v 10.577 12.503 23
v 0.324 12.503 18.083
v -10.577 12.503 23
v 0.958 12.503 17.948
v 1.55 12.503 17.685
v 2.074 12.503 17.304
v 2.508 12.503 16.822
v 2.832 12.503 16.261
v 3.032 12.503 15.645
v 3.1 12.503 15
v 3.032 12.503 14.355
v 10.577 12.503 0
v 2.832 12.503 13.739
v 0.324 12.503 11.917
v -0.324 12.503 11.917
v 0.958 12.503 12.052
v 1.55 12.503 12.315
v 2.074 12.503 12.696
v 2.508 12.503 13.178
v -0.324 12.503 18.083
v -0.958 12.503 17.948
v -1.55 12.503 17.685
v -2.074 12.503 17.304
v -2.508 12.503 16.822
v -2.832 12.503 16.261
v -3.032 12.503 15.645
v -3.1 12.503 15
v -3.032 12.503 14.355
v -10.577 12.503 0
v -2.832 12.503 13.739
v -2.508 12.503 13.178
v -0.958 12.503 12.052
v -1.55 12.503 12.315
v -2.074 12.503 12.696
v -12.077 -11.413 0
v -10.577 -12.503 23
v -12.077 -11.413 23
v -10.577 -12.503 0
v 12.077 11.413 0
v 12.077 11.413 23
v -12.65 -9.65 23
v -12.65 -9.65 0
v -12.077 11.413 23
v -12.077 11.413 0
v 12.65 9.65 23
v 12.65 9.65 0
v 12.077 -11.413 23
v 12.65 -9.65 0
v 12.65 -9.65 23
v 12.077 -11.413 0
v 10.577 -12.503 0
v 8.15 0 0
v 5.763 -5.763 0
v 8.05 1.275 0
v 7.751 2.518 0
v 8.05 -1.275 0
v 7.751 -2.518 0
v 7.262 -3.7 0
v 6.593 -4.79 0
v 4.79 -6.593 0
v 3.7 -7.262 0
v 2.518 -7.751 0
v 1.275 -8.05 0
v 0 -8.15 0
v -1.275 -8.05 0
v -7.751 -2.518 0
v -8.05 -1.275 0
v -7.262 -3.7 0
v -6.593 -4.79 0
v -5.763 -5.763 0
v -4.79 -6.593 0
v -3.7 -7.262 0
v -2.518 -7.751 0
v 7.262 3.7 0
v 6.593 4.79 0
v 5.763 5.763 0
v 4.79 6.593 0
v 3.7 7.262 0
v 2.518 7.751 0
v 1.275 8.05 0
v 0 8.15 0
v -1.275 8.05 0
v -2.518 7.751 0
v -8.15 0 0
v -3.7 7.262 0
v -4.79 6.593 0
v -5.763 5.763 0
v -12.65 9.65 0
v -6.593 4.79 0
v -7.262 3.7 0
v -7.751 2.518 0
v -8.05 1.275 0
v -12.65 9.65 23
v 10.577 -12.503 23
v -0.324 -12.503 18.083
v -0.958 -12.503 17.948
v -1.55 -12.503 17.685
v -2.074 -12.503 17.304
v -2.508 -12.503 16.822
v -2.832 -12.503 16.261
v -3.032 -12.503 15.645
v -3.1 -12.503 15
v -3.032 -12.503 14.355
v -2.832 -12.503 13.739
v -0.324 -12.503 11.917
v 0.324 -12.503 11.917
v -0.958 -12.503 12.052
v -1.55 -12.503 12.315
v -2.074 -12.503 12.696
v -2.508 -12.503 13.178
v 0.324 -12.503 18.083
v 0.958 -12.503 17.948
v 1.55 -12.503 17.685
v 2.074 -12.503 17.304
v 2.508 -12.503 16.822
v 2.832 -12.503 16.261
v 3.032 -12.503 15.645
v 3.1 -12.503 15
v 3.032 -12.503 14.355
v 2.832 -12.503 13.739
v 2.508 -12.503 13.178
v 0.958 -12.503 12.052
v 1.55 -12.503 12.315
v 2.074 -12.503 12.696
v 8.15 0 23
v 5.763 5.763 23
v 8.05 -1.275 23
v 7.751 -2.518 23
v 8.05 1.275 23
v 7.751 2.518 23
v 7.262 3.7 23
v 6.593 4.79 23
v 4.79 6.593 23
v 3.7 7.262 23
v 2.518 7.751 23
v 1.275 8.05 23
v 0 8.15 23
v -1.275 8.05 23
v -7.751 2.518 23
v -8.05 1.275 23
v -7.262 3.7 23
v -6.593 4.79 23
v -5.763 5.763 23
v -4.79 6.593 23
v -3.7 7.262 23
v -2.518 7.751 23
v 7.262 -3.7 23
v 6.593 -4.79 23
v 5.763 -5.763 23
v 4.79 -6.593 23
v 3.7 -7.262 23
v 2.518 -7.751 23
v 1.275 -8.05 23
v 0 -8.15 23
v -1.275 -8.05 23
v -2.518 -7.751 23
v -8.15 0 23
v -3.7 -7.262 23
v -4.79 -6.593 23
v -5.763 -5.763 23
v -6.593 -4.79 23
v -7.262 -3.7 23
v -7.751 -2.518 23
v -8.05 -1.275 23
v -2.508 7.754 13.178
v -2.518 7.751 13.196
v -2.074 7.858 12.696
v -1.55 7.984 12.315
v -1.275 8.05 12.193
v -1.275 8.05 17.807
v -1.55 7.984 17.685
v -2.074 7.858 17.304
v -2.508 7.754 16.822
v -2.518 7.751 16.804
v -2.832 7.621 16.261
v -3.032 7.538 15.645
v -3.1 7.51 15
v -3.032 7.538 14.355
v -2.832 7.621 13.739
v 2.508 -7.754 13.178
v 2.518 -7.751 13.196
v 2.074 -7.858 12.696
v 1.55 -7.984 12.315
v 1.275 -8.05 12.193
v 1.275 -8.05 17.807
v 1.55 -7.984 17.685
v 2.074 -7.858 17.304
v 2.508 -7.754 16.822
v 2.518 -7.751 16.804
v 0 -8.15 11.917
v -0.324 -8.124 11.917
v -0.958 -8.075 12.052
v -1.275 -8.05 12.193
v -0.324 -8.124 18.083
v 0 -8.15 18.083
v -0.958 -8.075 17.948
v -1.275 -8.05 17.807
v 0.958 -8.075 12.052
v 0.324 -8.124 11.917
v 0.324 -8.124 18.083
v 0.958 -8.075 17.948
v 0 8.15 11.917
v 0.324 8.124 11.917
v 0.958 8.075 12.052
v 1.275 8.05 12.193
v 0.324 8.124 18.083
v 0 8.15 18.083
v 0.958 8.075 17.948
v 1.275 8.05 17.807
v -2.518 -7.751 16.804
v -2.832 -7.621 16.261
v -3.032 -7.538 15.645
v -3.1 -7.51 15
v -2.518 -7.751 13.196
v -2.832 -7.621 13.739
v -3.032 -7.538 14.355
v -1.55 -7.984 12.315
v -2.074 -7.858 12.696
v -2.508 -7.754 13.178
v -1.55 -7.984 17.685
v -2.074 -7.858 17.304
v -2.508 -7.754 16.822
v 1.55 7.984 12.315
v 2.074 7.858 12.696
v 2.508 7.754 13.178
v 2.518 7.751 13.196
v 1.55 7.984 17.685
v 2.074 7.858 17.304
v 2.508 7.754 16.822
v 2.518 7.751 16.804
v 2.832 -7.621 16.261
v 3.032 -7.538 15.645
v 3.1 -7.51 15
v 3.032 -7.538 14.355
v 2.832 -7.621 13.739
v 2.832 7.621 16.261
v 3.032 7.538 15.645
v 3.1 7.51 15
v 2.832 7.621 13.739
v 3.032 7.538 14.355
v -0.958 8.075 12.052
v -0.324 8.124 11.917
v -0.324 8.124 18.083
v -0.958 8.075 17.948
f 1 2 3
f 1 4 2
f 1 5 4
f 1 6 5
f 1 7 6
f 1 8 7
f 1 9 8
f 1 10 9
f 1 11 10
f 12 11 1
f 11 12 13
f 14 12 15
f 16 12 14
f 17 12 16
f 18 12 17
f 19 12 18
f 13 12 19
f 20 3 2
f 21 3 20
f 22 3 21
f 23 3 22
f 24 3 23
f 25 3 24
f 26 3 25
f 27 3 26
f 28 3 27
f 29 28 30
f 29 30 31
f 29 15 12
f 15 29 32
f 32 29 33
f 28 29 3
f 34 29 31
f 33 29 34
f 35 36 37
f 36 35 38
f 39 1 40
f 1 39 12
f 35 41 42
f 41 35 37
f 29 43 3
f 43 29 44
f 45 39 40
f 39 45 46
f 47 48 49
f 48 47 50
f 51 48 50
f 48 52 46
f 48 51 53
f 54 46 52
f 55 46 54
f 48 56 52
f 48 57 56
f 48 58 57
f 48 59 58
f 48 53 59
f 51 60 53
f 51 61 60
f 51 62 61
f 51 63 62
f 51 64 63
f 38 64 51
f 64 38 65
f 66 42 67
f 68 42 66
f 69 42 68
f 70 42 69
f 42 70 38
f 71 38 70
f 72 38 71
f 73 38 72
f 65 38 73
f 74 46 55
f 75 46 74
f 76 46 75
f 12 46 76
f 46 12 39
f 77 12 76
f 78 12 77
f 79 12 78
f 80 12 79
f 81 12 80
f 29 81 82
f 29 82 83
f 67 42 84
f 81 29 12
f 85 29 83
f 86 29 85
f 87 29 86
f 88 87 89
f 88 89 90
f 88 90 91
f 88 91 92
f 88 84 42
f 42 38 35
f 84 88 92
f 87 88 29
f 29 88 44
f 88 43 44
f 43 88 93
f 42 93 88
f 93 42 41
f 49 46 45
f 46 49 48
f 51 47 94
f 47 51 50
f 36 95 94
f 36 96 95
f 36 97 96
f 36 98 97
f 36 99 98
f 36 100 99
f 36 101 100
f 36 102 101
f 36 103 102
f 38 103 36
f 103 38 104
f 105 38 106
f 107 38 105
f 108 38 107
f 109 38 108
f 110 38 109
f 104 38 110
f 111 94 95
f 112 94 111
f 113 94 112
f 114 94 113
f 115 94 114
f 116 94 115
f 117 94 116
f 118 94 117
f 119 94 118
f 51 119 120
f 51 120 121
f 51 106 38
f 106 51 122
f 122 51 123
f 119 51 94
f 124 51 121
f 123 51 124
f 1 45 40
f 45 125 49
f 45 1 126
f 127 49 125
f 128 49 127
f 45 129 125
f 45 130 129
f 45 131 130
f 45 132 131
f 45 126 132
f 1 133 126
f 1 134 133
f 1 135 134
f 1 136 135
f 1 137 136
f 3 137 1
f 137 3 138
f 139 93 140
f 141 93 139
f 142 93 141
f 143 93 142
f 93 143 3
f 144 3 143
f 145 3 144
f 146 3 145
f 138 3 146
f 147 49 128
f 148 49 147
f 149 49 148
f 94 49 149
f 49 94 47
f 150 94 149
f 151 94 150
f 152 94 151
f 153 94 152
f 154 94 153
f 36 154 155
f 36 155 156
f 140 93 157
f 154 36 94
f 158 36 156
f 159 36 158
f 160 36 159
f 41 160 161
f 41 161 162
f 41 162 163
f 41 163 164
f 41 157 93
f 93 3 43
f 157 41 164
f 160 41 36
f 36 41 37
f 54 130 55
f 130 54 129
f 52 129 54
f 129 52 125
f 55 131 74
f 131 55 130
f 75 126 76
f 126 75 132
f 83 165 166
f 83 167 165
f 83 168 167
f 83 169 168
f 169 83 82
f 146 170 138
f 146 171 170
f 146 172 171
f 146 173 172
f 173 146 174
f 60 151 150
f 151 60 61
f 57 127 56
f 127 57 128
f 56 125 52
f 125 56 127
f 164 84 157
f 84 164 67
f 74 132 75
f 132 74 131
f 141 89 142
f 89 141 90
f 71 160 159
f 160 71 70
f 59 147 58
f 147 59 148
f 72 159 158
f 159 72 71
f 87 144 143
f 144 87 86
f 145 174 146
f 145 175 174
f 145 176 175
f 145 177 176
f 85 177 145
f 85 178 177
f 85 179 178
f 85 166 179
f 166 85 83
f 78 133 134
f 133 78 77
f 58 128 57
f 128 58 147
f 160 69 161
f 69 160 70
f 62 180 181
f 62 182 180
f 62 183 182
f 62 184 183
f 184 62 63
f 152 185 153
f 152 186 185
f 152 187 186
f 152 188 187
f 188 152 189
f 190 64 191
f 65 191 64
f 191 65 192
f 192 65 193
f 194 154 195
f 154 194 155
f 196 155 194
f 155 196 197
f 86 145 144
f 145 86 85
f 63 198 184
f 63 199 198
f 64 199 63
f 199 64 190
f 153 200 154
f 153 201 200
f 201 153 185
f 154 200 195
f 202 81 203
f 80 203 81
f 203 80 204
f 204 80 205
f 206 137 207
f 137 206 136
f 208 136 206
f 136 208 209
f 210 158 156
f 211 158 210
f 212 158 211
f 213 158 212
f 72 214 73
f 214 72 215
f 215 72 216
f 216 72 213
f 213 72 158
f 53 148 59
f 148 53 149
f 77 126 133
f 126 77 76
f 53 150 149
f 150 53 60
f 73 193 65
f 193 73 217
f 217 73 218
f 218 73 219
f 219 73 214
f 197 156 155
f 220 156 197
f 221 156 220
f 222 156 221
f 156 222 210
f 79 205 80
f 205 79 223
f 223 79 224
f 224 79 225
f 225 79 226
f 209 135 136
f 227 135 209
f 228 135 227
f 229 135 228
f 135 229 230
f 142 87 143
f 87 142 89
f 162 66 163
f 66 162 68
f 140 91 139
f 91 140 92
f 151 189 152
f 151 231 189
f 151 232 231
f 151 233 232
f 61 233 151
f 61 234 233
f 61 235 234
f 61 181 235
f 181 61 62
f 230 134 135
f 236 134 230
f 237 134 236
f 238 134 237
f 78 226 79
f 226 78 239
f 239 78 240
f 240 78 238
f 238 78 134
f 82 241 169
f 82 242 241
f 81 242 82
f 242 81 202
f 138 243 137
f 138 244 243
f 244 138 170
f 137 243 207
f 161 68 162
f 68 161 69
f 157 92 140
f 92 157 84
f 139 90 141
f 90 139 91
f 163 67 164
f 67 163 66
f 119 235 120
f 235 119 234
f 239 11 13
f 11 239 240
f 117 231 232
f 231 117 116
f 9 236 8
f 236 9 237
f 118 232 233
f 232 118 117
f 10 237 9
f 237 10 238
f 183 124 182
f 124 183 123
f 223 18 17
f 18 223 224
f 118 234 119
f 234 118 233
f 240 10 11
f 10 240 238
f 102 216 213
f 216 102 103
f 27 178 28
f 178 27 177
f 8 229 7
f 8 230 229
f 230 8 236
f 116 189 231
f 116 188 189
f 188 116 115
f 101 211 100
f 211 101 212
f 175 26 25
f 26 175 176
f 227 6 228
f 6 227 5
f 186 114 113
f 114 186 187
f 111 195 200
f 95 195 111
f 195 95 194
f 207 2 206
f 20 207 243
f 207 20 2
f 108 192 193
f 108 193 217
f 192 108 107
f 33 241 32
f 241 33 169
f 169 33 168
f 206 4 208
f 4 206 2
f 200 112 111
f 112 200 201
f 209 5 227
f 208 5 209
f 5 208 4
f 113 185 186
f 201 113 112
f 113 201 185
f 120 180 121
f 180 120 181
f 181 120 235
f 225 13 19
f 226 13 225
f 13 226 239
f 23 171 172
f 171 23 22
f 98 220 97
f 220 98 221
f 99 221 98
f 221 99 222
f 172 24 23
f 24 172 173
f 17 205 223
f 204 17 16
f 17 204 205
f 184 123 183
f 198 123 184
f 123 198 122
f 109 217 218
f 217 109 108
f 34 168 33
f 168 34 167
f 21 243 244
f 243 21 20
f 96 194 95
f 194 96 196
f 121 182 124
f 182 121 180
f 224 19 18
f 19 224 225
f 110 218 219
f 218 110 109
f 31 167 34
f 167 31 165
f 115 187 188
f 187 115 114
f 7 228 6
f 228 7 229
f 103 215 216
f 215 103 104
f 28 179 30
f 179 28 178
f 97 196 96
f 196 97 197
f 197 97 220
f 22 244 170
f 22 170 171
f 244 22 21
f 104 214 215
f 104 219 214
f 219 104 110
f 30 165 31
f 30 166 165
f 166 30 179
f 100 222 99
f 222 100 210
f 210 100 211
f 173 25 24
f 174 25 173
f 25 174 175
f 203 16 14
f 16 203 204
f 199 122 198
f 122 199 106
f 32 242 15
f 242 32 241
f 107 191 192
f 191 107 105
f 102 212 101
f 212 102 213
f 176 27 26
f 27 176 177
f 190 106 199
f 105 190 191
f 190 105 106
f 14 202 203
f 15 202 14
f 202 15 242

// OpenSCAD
// file: dronePlates.scad
/**
 * dronePlates.scad
 * Plate library
 *
 * GNU GPL V3
 * @author: Victor Potenciano
 */

m3Rad = 3.4/2;
cornerR = 4;

/**
 *
 */
module helperDisk(diameter) {
	cylinder(r = diameter/2, h = 0.6, $fn=20);
}

/**
 *
 */
module roundedRect(size, radius) {
	x = size[0];
	y = size[1];
	z = size[2];

	linear_extrude(height=z)
	hull() {
	// place 4 circles in the corners, with the given radius
	translate([(-x/2)+(radius/2), (-y/2)+(radius/2), 0]){ circle(r=radius); }
	translate([(x/2)-(radius/2), (-y/2)+(radius/2), 0]){ circle(r=radius); }
	translate([(-x/2)+(radius/2), (y/2)-(radius/2), 0]){ circle(r=radius); }
	translate([(x/2)-(radius/2), (y/2)-(radius/2), 0]){ circle(r=radius); }
	}
}

/**
 * rounded rectangle triangle with corner at origin
 */
module roundedTriangle(size, radius) {
	x = size[0];
	y = size[1];
	z = size[2];

	linear_extrude(height=z)
	hull() {
	translate([radius, radius, 0]){ circle(r=radius); }
	translate([x-radius, radius, 0]){ circle(r=radius); }
	translate([radius, y-radius, 0]){ circle(r=radius); }
	}
}

/**
 *
 */
module roundRectPlate(w, l, plateThick=3) {
	difference(){
		roundedRect([l+m3Rad*1.75,w+m3Rad*1.75,plateThick], cornerR);
		translate([l/2, w/2, -0.5]) { cylinder(h = plateThick+1, r = m3Rad, $fn=30); }
		translate([-l/2, w/2, -0.5]) { cylinder(h = plateThick+1, r = m3Rad, $fn=30); }
		translate([l/2, -w/2, -0.5]) { cylinder(h = plateThick+1, r = m3Rad, $fn=30); }
		translate([-l/2, -w/2, -0.5]) { cylinder(h = plateThick+1, r = m3Rad, $fn=30); }
	}
}

/**
 *
 */
module crossSquarePlate(l, thick=3) {
	inDist = cornerR*2+4;
	trianL = sqrt((l*l)/2)-inDist;
	centerR = 4;

	difference(){
		roundRectPlate(l, l, thick);
		translate([0, centerR, -0.5]) { 
			rotate([0,0,45]){ roundedTriangle([trianL,trianL,thick+1], cornerR-2); }
		}
		translate([0, -centerR, -0.5]) { 
			rotate([0,0,225]){ roundedTriangle([trianL,trianL,thick+1], cornerR-2); }
		}
		translate([-centerR, 0, -0.5]) { 
			rotate([0,0,135]){ roundedTriangle([trianL,trianL,thick+1], cornerR-2); }
		}
		translate([centerR, 0, -0.5]) { 
			rotate([0,0,-45]){ roundedTriangle([trianL,trianL,thick+1], cornerR-2); }
		}
	}
}

/**
 *
 */
module hShapePlate(w, l, thick=4) {
	inDist = cornerR*2+1;

	difference(){
		roundRectPlate(w, l, thick);
		translate([0, w/4, -0.5]) { roundedRect([l-inDist,w/2-inDist,thick+1], cornerR-2); }
		translate([0, -w/4, -0.5]) { roundedRect([l-inDist,w/2-inDist,thick+1], cornerR-2); }
	}
}

/**
 *
 */
module motorCircleMount(inDia, outDia, thick=3, extraH=false, d1=19, d2=16, holeR=m3Rad ) {
	difference(){
		cylinder(h = thick, r = outDia/2, $fn=30);
		motorCircleMountHoles(inDia, outDia, thick, extraH, d1=d1, d2=d2, holeR=holeR);
	}
}

/**
 *
 */
module motorCircleMountHoles(inDia, outDia, thick=3, extraH=false, d1=19, d2=16, d3=25, holeR=m3Rad) {
	translate([0, 0, -0.5]) { cylinder(h = thick+1, r = inDia/2, $fn=30); }

	for(i=[0:3]) {
		rotate([0,0,90*i]){
		translate([d1/2, 0, -0.5]) cylinder(h = thick+1, r = holeR, $fn=20);
		translate([d2/2, 0, -0.5]) cylinder(h = thick+1, r = holeR, $fn=20);
		translate([d2/2, -holeR, -0.5]) cube(size = [(d1-d2)/2,holeR*2,thick+1]);
		}
	}
	
	if(extraH==true){	
		for(i=[-1,1]) translate([i*d3/2, 0, -0.5]) { cylinder(h = thick+1, r = holeR, $fn=30); }
	}
}

/**
 *
 */
module motorRectMount(w, l, inDia, thick=3) {
	d1=19;
	d2=16;

	difference(){
		roundRectPlate(w, l, thick);
		translate([0, 0, -0.5]) { cylinder(h = thick+1, r = inDia/2, $fn=30); }
		translate([0, d1/2, -0.5]) { cylinder(h = thick+1, r = m3Rad, $fn=30); }
		translate([0, -d1/2, -0.5]) { cylinder(h = thick+1, r = m3Rad, $fn=30); }
		translate([d2/2, 0, -0.5]) { cylinder(h = thick+1, r = m3Rad, $fn=30); }
		translate([-d2/2, 0, -0.5]) { cylinder(h = thick+1, r = m3Rad, $fn=30); }
	}
}

/**
 *
 */
module tube(inDia, outDia, height) {
	difference(){
		cylinder(h = height, r = outDia/2, $fn=50);
		translate([0, 0, -0.5]) { cylinder(h = height+1, r = inDia/2, $fn=30); }
	}
}

/**
 *
 */
module squareTube(inDia, outDia, height) {
	translate([0,0,height/2]){
	difference(){
		cube(size = [outDia,outDia,height], center = true);
		cube(size = [inDia,inDia,height+1], center = true);
	}
	}
}

/**
 *
 */
module djiFlamewheelHoles(height) {
	a = 23;
	b = 16;
	c = 19.5;
	
	translate([a/2, c/2, 0]) { cylinder(h = height, r = m3Rad, $fn=30); }
	translate([-a/2, c/2, 0]) { cylinder(h = height, r = m3Rad, $fn=30); }
	translate([b/2, -c/2, 0]) { cylinder(h = height, r = m3Rad, $fn=30); }
	translate([-b/2, -c/2, 0]) { cylinder(h = height, r = m3Rad, $fn=30); }
}

/**
 *
 */
module djiFlamewheelHolesBotton(height) {
	a1 = 21;
	c = 19.5;
	
	translate([a1/2, c/2, 0]) { cylinder(h = height, r = m3Rad, $fn=30); }
	translate([-a1/2, c/2, 0]) { cylinder(h = height, r = m3Rad, $fn=30); }
}

/**
 *
 */
module propeller(size){
union(){
difference(){
	cylinder(h = 3, r = size/2, center=true, $fn=30);
	cylinder(h = 3.1, r = size/2-2, center=true, $fn=30); 
}
for( i = [-1,1] ){
rotate([0,0,45*i]){ cube(size = [size,4,1], center = true); }
}
}
}

/**
 *
 */
module slot(length, height, rad){
for(i=[-1,1]) translate([i*length/2,0,0]) cylinder(h = height, r = rad, $fn=30);
translate([0,0,height/2]) cube(size = [length,rad*2,height], center = true);
}

 

////////////////////////
// Examples:
////////////////////////

motorCircleMount(8, 25, 3.5);

//roundedRect([50,50,3], 4);

//hShapePlate(79, 25);

//rotate([0,0,45]){roundedTriangle([40,40,3], 4);}

//crossSquarePlate(45, 4);

/*
union(){
motorRectMount(21, 18, 8, 4);
translate([9, 10.5, 0]) {tube(m3Rad*2, 6.5, 6);}
}
*/

/*
difference(){
union(){
hShapePlate(50, 30, 3.5);
translate([-4,-25,0]){cube(size = [8,50,3.5]);}
rotate([0, 0, 45]) {motorCircleMount(8, 35, 3.5);}
}
cylinder(h = 10, r = 4, $fn=100, center=true);
}
*/

//rotate([90,0,0]){ tube(5,10,20); }
//translate([20,0,0]){ squareTube(5, 10, 20); }
// main file
/**
 * cinetank motor mount arm drill guide
 */
 
 use <dronePlates.scad>
 
 tubeD = 16.3;
 
 difference(){
    roundedRect([tubeD+6,tubeD+6,23],3);
     
    cylinder(r=tubeD/2,h=40,$fn=40);
     
    translate([0,0,15]) rotate([90,0,0]) cylinder(r=6.2/2,h=40,$fn=30,center=true);
 }
